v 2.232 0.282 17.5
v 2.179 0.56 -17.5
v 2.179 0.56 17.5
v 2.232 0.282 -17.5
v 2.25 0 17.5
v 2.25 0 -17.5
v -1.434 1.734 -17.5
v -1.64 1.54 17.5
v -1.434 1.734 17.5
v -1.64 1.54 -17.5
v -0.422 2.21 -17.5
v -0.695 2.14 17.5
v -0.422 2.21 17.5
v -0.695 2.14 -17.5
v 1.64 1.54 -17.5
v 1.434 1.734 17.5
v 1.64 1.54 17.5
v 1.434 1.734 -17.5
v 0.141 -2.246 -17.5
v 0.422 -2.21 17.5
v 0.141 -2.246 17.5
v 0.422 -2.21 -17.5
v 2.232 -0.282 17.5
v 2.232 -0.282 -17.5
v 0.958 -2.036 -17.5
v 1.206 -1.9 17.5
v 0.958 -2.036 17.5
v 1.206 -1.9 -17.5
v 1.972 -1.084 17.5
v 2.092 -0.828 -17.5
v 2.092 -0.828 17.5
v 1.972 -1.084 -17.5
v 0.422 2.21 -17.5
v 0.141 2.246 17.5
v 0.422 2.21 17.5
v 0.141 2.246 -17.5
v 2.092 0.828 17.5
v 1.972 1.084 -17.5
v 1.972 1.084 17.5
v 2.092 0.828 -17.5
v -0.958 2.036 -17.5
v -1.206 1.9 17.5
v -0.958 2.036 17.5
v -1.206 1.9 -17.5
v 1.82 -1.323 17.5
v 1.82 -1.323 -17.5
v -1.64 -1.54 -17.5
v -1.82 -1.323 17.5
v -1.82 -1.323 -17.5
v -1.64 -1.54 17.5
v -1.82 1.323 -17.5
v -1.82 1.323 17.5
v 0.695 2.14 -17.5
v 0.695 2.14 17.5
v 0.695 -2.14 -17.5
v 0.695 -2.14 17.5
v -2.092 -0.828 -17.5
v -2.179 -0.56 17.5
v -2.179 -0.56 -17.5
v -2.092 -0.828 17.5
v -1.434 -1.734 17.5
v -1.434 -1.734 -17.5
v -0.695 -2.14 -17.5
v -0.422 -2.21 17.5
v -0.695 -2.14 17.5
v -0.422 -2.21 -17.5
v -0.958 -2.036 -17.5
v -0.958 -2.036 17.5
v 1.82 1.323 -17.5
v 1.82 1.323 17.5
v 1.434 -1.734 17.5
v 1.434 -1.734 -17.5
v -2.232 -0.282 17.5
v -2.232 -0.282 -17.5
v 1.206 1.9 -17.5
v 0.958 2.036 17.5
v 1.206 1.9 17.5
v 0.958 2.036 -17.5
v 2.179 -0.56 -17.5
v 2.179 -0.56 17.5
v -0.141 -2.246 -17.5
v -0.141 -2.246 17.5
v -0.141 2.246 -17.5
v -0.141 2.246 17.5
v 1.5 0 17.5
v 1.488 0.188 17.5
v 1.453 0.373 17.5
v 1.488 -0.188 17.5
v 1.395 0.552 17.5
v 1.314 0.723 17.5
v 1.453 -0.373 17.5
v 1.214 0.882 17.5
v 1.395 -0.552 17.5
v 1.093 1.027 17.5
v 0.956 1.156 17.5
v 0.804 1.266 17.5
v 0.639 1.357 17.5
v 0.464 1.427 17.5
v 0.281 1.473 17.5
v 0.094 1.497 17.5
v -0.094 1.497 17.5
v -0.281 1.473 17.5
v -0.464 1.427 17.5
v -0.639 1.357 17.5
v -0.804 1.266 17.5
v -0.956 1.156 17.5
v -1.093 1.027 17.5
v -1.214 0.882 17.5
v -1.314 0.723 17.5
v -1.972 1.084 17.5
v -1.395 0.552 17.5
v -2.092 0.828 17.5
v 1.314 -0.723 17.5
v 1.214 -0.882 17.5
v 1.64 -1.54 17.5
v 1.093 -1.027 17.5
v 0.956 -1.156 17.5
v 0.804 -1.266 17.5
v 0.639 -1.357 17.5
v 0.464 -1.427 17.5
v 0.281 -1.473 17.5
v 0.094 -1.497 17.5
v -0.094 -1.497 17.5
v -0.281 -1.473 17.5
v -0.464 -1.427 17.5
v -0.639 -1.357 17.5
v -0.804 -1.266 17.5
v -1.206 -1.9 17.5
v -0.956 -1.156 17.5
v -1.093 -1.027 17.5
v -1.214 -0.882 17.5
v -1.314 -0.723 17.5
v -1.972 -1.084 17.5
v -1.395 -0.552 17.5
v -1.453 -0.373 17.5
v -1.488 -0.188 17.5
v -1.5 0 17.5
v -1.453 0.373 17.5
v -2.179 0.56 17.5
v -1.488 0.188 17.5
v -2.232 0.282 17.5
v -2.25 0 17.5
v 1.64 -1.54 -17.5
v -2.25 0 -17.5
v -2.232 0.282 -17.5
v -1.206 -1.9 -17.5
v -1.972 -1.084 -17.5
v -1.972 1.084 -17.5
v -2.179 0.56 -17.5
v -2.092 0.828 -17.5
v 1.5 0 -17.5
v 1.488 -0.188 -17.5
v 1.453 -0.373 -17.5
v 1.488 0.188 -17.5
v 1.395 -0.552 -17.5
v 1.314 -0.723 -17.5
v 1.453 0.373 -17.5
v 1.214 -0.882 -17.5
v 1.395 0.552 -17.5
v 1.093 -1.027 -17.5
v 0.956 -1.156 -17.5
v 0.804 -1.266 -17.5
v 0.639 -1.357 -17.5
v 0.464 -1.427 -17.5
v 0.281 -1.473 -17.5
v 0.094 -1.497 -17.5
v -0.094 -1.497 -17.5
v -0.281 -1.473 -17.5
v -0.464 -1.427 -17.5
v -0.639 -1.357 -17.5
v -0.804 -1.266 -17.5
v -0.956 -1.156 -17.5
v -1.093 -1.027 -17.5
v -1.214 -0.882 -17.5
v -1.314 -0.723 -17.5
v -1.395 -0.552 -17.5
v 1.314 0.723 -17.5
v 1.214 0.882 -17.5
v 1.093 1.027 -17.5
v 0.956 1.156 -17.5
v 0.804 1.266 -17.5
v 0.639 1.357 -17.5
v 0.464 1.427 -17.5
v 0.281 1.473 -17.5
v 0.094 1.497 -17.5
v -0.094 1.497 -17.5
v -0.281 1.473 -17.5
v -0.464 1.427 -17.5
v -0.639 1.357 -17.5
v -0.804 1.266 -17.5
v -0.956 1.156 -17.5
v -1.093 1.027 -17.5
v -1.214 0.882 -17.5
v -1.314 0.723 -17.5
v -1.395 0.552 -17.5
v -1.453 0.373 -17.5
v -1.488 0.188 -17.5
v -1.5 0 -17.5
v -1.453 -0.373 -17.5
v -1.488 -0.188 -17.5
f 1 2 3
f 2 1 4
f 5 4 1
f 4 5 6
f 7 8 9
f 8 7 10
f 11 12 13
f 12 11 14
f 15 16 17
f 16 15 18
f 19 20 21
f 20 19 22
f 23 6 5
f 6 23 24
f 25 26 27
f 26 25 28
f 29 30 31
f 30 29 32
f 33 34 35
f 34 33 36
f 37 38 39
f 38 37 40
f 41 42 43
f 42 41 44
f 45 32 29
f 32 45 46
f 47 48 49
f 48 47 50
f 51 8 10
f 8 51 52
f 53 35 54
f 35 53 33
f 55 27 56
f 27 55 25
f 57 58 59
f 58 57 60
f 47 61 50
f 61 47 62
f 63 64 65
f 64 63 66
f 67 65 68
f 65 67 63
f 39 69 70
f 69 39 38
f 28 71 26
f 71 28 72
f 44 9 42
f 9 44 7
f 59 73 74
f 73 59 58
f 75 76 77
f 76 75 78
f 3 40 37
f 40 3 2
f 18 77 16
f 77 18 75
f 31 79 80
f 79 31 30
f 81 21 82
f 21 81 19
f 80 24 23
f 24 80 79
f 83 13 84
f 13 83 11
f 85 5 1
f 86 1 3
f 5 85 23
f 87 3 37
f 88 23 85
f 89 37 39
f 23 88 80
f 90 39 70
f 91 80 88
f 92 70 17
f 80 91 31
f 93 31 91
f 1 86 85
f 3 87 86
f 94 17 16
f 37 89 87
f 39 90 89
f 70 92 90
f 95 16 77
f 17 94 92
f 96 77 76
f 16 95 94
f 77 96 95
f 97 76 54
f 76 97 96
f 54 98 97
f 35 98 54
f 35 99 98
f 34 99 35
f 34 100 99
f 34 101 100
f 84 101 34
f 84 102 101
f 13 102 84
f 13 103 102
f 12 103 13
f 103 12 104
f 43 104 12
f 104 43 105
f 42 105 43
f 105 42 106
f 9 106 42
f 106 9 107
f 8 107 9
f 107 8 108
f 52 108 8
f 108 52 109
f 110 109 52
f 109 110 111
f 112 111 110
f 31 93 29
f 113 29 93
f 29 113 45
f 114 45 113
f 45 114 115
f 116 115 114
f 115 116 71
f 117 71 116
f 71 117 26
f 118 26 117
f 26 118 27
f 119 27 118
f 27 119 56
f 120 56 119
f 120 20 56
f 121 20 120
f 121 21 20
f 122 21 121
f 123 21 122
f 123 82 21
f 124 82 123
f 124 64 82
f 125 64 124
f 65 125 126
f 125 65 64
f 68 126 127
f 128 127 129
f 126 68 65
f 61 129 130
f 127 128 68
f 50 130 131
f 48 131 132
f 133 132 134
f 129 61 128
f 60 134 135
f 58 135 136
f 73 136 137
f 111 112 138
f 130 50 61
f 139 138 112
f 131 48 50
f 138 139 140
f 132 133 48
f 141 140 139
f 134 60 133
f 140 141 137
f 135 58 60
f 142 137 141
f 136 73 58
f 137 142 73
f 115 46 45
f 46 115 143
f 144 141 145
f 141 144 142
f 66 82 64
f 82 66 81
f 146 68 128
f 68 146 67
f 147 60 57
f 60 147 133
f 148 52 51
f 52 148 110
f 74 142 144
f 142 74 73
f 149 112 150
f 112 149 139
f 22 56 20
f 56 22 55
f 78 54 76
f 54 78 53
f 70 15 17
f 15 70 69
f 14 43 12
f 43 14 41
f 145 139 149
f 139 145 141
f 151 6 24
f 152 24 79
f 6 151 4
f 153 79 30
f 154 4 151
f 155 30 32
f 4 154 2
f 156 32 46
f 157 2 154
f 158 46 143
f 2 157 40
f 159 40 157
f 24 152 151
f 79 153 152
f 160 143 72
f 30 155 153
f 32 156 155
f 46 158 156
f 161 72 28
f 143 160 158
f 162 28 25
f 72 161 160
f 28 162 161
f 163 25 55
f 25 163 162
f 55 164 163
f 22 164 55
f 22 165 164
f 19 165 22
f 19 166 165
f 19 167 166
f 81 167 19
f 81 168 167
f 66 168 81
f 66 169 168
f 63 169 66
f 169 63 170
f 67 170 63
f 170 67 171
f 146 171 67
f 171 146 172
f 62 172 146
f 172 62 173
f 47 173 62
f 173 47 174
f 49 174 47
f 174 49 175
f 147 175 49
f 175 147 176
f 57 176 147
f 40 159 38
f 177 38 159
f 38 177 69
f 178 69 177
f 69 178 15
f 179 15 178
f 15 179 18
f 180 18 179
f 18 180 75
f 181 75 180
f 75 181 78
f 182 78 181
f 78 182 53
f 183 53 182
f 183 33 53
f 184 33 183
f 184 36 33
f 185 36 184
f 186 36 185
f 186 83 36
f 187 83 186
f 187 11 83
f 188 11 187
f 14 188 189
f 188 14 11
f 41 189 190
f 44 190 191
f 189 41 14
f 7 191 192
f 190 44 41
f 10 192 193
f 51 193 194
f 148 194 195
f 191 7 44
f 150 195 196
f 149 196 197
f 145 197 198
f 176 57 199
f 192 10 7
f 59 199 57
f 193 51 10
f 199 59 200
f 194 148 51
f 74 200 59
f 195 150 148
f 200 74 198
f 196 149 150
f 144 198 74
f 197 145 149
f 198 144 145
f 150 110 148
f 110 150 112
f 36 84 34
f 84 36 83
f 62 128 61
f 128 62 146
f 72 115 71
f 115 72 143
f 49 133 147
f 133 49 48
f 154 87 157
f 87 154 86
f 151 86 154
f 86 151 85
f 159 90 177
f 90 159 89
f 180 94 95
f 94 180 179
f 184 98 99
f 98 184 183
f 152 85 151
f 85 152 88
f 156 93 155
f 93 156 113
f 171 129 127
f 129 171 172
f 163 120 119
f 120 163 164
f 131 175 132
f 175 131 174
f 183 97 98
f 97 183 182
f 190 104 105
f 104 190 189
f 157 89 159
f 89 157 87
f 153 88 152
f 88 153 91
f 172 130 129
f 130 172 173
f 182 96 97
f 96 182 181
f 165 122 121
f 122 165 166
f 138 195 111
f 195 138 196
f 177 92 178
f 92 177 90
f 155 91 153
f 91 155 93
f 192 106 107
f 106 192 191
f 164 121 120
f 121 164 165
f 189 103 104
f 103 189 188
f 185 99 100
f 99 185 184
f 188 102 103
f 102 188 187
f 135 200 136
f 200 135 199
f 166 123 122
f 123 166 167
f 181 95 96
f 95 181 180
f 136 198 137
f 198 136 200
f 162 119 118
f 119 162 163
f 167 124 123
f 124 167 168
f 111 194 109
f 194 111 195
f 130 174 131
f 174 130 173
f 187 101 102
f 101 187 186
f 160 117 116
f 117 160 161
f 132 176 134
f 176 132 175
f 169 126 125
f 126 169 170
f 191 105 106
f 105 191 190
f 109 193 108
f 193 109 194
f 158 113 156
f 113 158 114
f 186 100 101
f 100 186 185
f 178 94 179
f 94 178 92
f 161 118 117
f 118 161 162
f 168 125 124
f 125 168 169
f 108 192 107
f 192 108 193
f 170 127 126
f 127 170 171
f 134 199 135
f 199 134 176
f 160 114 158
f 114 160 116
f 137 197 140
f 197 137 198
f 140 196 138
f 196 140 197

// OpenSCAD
$fn = 50;


difference() {
	union() {
		translate(v = [0, 0, -17.5000000000]) {
			cylinder(h = 35, r = 2.2500000000);
		}
	}
	union() {
		translate(v = [0, 0, -100.0000000000]) {
			cylinder(h = 200, r = 1.5000000000);
		}
	}
}
